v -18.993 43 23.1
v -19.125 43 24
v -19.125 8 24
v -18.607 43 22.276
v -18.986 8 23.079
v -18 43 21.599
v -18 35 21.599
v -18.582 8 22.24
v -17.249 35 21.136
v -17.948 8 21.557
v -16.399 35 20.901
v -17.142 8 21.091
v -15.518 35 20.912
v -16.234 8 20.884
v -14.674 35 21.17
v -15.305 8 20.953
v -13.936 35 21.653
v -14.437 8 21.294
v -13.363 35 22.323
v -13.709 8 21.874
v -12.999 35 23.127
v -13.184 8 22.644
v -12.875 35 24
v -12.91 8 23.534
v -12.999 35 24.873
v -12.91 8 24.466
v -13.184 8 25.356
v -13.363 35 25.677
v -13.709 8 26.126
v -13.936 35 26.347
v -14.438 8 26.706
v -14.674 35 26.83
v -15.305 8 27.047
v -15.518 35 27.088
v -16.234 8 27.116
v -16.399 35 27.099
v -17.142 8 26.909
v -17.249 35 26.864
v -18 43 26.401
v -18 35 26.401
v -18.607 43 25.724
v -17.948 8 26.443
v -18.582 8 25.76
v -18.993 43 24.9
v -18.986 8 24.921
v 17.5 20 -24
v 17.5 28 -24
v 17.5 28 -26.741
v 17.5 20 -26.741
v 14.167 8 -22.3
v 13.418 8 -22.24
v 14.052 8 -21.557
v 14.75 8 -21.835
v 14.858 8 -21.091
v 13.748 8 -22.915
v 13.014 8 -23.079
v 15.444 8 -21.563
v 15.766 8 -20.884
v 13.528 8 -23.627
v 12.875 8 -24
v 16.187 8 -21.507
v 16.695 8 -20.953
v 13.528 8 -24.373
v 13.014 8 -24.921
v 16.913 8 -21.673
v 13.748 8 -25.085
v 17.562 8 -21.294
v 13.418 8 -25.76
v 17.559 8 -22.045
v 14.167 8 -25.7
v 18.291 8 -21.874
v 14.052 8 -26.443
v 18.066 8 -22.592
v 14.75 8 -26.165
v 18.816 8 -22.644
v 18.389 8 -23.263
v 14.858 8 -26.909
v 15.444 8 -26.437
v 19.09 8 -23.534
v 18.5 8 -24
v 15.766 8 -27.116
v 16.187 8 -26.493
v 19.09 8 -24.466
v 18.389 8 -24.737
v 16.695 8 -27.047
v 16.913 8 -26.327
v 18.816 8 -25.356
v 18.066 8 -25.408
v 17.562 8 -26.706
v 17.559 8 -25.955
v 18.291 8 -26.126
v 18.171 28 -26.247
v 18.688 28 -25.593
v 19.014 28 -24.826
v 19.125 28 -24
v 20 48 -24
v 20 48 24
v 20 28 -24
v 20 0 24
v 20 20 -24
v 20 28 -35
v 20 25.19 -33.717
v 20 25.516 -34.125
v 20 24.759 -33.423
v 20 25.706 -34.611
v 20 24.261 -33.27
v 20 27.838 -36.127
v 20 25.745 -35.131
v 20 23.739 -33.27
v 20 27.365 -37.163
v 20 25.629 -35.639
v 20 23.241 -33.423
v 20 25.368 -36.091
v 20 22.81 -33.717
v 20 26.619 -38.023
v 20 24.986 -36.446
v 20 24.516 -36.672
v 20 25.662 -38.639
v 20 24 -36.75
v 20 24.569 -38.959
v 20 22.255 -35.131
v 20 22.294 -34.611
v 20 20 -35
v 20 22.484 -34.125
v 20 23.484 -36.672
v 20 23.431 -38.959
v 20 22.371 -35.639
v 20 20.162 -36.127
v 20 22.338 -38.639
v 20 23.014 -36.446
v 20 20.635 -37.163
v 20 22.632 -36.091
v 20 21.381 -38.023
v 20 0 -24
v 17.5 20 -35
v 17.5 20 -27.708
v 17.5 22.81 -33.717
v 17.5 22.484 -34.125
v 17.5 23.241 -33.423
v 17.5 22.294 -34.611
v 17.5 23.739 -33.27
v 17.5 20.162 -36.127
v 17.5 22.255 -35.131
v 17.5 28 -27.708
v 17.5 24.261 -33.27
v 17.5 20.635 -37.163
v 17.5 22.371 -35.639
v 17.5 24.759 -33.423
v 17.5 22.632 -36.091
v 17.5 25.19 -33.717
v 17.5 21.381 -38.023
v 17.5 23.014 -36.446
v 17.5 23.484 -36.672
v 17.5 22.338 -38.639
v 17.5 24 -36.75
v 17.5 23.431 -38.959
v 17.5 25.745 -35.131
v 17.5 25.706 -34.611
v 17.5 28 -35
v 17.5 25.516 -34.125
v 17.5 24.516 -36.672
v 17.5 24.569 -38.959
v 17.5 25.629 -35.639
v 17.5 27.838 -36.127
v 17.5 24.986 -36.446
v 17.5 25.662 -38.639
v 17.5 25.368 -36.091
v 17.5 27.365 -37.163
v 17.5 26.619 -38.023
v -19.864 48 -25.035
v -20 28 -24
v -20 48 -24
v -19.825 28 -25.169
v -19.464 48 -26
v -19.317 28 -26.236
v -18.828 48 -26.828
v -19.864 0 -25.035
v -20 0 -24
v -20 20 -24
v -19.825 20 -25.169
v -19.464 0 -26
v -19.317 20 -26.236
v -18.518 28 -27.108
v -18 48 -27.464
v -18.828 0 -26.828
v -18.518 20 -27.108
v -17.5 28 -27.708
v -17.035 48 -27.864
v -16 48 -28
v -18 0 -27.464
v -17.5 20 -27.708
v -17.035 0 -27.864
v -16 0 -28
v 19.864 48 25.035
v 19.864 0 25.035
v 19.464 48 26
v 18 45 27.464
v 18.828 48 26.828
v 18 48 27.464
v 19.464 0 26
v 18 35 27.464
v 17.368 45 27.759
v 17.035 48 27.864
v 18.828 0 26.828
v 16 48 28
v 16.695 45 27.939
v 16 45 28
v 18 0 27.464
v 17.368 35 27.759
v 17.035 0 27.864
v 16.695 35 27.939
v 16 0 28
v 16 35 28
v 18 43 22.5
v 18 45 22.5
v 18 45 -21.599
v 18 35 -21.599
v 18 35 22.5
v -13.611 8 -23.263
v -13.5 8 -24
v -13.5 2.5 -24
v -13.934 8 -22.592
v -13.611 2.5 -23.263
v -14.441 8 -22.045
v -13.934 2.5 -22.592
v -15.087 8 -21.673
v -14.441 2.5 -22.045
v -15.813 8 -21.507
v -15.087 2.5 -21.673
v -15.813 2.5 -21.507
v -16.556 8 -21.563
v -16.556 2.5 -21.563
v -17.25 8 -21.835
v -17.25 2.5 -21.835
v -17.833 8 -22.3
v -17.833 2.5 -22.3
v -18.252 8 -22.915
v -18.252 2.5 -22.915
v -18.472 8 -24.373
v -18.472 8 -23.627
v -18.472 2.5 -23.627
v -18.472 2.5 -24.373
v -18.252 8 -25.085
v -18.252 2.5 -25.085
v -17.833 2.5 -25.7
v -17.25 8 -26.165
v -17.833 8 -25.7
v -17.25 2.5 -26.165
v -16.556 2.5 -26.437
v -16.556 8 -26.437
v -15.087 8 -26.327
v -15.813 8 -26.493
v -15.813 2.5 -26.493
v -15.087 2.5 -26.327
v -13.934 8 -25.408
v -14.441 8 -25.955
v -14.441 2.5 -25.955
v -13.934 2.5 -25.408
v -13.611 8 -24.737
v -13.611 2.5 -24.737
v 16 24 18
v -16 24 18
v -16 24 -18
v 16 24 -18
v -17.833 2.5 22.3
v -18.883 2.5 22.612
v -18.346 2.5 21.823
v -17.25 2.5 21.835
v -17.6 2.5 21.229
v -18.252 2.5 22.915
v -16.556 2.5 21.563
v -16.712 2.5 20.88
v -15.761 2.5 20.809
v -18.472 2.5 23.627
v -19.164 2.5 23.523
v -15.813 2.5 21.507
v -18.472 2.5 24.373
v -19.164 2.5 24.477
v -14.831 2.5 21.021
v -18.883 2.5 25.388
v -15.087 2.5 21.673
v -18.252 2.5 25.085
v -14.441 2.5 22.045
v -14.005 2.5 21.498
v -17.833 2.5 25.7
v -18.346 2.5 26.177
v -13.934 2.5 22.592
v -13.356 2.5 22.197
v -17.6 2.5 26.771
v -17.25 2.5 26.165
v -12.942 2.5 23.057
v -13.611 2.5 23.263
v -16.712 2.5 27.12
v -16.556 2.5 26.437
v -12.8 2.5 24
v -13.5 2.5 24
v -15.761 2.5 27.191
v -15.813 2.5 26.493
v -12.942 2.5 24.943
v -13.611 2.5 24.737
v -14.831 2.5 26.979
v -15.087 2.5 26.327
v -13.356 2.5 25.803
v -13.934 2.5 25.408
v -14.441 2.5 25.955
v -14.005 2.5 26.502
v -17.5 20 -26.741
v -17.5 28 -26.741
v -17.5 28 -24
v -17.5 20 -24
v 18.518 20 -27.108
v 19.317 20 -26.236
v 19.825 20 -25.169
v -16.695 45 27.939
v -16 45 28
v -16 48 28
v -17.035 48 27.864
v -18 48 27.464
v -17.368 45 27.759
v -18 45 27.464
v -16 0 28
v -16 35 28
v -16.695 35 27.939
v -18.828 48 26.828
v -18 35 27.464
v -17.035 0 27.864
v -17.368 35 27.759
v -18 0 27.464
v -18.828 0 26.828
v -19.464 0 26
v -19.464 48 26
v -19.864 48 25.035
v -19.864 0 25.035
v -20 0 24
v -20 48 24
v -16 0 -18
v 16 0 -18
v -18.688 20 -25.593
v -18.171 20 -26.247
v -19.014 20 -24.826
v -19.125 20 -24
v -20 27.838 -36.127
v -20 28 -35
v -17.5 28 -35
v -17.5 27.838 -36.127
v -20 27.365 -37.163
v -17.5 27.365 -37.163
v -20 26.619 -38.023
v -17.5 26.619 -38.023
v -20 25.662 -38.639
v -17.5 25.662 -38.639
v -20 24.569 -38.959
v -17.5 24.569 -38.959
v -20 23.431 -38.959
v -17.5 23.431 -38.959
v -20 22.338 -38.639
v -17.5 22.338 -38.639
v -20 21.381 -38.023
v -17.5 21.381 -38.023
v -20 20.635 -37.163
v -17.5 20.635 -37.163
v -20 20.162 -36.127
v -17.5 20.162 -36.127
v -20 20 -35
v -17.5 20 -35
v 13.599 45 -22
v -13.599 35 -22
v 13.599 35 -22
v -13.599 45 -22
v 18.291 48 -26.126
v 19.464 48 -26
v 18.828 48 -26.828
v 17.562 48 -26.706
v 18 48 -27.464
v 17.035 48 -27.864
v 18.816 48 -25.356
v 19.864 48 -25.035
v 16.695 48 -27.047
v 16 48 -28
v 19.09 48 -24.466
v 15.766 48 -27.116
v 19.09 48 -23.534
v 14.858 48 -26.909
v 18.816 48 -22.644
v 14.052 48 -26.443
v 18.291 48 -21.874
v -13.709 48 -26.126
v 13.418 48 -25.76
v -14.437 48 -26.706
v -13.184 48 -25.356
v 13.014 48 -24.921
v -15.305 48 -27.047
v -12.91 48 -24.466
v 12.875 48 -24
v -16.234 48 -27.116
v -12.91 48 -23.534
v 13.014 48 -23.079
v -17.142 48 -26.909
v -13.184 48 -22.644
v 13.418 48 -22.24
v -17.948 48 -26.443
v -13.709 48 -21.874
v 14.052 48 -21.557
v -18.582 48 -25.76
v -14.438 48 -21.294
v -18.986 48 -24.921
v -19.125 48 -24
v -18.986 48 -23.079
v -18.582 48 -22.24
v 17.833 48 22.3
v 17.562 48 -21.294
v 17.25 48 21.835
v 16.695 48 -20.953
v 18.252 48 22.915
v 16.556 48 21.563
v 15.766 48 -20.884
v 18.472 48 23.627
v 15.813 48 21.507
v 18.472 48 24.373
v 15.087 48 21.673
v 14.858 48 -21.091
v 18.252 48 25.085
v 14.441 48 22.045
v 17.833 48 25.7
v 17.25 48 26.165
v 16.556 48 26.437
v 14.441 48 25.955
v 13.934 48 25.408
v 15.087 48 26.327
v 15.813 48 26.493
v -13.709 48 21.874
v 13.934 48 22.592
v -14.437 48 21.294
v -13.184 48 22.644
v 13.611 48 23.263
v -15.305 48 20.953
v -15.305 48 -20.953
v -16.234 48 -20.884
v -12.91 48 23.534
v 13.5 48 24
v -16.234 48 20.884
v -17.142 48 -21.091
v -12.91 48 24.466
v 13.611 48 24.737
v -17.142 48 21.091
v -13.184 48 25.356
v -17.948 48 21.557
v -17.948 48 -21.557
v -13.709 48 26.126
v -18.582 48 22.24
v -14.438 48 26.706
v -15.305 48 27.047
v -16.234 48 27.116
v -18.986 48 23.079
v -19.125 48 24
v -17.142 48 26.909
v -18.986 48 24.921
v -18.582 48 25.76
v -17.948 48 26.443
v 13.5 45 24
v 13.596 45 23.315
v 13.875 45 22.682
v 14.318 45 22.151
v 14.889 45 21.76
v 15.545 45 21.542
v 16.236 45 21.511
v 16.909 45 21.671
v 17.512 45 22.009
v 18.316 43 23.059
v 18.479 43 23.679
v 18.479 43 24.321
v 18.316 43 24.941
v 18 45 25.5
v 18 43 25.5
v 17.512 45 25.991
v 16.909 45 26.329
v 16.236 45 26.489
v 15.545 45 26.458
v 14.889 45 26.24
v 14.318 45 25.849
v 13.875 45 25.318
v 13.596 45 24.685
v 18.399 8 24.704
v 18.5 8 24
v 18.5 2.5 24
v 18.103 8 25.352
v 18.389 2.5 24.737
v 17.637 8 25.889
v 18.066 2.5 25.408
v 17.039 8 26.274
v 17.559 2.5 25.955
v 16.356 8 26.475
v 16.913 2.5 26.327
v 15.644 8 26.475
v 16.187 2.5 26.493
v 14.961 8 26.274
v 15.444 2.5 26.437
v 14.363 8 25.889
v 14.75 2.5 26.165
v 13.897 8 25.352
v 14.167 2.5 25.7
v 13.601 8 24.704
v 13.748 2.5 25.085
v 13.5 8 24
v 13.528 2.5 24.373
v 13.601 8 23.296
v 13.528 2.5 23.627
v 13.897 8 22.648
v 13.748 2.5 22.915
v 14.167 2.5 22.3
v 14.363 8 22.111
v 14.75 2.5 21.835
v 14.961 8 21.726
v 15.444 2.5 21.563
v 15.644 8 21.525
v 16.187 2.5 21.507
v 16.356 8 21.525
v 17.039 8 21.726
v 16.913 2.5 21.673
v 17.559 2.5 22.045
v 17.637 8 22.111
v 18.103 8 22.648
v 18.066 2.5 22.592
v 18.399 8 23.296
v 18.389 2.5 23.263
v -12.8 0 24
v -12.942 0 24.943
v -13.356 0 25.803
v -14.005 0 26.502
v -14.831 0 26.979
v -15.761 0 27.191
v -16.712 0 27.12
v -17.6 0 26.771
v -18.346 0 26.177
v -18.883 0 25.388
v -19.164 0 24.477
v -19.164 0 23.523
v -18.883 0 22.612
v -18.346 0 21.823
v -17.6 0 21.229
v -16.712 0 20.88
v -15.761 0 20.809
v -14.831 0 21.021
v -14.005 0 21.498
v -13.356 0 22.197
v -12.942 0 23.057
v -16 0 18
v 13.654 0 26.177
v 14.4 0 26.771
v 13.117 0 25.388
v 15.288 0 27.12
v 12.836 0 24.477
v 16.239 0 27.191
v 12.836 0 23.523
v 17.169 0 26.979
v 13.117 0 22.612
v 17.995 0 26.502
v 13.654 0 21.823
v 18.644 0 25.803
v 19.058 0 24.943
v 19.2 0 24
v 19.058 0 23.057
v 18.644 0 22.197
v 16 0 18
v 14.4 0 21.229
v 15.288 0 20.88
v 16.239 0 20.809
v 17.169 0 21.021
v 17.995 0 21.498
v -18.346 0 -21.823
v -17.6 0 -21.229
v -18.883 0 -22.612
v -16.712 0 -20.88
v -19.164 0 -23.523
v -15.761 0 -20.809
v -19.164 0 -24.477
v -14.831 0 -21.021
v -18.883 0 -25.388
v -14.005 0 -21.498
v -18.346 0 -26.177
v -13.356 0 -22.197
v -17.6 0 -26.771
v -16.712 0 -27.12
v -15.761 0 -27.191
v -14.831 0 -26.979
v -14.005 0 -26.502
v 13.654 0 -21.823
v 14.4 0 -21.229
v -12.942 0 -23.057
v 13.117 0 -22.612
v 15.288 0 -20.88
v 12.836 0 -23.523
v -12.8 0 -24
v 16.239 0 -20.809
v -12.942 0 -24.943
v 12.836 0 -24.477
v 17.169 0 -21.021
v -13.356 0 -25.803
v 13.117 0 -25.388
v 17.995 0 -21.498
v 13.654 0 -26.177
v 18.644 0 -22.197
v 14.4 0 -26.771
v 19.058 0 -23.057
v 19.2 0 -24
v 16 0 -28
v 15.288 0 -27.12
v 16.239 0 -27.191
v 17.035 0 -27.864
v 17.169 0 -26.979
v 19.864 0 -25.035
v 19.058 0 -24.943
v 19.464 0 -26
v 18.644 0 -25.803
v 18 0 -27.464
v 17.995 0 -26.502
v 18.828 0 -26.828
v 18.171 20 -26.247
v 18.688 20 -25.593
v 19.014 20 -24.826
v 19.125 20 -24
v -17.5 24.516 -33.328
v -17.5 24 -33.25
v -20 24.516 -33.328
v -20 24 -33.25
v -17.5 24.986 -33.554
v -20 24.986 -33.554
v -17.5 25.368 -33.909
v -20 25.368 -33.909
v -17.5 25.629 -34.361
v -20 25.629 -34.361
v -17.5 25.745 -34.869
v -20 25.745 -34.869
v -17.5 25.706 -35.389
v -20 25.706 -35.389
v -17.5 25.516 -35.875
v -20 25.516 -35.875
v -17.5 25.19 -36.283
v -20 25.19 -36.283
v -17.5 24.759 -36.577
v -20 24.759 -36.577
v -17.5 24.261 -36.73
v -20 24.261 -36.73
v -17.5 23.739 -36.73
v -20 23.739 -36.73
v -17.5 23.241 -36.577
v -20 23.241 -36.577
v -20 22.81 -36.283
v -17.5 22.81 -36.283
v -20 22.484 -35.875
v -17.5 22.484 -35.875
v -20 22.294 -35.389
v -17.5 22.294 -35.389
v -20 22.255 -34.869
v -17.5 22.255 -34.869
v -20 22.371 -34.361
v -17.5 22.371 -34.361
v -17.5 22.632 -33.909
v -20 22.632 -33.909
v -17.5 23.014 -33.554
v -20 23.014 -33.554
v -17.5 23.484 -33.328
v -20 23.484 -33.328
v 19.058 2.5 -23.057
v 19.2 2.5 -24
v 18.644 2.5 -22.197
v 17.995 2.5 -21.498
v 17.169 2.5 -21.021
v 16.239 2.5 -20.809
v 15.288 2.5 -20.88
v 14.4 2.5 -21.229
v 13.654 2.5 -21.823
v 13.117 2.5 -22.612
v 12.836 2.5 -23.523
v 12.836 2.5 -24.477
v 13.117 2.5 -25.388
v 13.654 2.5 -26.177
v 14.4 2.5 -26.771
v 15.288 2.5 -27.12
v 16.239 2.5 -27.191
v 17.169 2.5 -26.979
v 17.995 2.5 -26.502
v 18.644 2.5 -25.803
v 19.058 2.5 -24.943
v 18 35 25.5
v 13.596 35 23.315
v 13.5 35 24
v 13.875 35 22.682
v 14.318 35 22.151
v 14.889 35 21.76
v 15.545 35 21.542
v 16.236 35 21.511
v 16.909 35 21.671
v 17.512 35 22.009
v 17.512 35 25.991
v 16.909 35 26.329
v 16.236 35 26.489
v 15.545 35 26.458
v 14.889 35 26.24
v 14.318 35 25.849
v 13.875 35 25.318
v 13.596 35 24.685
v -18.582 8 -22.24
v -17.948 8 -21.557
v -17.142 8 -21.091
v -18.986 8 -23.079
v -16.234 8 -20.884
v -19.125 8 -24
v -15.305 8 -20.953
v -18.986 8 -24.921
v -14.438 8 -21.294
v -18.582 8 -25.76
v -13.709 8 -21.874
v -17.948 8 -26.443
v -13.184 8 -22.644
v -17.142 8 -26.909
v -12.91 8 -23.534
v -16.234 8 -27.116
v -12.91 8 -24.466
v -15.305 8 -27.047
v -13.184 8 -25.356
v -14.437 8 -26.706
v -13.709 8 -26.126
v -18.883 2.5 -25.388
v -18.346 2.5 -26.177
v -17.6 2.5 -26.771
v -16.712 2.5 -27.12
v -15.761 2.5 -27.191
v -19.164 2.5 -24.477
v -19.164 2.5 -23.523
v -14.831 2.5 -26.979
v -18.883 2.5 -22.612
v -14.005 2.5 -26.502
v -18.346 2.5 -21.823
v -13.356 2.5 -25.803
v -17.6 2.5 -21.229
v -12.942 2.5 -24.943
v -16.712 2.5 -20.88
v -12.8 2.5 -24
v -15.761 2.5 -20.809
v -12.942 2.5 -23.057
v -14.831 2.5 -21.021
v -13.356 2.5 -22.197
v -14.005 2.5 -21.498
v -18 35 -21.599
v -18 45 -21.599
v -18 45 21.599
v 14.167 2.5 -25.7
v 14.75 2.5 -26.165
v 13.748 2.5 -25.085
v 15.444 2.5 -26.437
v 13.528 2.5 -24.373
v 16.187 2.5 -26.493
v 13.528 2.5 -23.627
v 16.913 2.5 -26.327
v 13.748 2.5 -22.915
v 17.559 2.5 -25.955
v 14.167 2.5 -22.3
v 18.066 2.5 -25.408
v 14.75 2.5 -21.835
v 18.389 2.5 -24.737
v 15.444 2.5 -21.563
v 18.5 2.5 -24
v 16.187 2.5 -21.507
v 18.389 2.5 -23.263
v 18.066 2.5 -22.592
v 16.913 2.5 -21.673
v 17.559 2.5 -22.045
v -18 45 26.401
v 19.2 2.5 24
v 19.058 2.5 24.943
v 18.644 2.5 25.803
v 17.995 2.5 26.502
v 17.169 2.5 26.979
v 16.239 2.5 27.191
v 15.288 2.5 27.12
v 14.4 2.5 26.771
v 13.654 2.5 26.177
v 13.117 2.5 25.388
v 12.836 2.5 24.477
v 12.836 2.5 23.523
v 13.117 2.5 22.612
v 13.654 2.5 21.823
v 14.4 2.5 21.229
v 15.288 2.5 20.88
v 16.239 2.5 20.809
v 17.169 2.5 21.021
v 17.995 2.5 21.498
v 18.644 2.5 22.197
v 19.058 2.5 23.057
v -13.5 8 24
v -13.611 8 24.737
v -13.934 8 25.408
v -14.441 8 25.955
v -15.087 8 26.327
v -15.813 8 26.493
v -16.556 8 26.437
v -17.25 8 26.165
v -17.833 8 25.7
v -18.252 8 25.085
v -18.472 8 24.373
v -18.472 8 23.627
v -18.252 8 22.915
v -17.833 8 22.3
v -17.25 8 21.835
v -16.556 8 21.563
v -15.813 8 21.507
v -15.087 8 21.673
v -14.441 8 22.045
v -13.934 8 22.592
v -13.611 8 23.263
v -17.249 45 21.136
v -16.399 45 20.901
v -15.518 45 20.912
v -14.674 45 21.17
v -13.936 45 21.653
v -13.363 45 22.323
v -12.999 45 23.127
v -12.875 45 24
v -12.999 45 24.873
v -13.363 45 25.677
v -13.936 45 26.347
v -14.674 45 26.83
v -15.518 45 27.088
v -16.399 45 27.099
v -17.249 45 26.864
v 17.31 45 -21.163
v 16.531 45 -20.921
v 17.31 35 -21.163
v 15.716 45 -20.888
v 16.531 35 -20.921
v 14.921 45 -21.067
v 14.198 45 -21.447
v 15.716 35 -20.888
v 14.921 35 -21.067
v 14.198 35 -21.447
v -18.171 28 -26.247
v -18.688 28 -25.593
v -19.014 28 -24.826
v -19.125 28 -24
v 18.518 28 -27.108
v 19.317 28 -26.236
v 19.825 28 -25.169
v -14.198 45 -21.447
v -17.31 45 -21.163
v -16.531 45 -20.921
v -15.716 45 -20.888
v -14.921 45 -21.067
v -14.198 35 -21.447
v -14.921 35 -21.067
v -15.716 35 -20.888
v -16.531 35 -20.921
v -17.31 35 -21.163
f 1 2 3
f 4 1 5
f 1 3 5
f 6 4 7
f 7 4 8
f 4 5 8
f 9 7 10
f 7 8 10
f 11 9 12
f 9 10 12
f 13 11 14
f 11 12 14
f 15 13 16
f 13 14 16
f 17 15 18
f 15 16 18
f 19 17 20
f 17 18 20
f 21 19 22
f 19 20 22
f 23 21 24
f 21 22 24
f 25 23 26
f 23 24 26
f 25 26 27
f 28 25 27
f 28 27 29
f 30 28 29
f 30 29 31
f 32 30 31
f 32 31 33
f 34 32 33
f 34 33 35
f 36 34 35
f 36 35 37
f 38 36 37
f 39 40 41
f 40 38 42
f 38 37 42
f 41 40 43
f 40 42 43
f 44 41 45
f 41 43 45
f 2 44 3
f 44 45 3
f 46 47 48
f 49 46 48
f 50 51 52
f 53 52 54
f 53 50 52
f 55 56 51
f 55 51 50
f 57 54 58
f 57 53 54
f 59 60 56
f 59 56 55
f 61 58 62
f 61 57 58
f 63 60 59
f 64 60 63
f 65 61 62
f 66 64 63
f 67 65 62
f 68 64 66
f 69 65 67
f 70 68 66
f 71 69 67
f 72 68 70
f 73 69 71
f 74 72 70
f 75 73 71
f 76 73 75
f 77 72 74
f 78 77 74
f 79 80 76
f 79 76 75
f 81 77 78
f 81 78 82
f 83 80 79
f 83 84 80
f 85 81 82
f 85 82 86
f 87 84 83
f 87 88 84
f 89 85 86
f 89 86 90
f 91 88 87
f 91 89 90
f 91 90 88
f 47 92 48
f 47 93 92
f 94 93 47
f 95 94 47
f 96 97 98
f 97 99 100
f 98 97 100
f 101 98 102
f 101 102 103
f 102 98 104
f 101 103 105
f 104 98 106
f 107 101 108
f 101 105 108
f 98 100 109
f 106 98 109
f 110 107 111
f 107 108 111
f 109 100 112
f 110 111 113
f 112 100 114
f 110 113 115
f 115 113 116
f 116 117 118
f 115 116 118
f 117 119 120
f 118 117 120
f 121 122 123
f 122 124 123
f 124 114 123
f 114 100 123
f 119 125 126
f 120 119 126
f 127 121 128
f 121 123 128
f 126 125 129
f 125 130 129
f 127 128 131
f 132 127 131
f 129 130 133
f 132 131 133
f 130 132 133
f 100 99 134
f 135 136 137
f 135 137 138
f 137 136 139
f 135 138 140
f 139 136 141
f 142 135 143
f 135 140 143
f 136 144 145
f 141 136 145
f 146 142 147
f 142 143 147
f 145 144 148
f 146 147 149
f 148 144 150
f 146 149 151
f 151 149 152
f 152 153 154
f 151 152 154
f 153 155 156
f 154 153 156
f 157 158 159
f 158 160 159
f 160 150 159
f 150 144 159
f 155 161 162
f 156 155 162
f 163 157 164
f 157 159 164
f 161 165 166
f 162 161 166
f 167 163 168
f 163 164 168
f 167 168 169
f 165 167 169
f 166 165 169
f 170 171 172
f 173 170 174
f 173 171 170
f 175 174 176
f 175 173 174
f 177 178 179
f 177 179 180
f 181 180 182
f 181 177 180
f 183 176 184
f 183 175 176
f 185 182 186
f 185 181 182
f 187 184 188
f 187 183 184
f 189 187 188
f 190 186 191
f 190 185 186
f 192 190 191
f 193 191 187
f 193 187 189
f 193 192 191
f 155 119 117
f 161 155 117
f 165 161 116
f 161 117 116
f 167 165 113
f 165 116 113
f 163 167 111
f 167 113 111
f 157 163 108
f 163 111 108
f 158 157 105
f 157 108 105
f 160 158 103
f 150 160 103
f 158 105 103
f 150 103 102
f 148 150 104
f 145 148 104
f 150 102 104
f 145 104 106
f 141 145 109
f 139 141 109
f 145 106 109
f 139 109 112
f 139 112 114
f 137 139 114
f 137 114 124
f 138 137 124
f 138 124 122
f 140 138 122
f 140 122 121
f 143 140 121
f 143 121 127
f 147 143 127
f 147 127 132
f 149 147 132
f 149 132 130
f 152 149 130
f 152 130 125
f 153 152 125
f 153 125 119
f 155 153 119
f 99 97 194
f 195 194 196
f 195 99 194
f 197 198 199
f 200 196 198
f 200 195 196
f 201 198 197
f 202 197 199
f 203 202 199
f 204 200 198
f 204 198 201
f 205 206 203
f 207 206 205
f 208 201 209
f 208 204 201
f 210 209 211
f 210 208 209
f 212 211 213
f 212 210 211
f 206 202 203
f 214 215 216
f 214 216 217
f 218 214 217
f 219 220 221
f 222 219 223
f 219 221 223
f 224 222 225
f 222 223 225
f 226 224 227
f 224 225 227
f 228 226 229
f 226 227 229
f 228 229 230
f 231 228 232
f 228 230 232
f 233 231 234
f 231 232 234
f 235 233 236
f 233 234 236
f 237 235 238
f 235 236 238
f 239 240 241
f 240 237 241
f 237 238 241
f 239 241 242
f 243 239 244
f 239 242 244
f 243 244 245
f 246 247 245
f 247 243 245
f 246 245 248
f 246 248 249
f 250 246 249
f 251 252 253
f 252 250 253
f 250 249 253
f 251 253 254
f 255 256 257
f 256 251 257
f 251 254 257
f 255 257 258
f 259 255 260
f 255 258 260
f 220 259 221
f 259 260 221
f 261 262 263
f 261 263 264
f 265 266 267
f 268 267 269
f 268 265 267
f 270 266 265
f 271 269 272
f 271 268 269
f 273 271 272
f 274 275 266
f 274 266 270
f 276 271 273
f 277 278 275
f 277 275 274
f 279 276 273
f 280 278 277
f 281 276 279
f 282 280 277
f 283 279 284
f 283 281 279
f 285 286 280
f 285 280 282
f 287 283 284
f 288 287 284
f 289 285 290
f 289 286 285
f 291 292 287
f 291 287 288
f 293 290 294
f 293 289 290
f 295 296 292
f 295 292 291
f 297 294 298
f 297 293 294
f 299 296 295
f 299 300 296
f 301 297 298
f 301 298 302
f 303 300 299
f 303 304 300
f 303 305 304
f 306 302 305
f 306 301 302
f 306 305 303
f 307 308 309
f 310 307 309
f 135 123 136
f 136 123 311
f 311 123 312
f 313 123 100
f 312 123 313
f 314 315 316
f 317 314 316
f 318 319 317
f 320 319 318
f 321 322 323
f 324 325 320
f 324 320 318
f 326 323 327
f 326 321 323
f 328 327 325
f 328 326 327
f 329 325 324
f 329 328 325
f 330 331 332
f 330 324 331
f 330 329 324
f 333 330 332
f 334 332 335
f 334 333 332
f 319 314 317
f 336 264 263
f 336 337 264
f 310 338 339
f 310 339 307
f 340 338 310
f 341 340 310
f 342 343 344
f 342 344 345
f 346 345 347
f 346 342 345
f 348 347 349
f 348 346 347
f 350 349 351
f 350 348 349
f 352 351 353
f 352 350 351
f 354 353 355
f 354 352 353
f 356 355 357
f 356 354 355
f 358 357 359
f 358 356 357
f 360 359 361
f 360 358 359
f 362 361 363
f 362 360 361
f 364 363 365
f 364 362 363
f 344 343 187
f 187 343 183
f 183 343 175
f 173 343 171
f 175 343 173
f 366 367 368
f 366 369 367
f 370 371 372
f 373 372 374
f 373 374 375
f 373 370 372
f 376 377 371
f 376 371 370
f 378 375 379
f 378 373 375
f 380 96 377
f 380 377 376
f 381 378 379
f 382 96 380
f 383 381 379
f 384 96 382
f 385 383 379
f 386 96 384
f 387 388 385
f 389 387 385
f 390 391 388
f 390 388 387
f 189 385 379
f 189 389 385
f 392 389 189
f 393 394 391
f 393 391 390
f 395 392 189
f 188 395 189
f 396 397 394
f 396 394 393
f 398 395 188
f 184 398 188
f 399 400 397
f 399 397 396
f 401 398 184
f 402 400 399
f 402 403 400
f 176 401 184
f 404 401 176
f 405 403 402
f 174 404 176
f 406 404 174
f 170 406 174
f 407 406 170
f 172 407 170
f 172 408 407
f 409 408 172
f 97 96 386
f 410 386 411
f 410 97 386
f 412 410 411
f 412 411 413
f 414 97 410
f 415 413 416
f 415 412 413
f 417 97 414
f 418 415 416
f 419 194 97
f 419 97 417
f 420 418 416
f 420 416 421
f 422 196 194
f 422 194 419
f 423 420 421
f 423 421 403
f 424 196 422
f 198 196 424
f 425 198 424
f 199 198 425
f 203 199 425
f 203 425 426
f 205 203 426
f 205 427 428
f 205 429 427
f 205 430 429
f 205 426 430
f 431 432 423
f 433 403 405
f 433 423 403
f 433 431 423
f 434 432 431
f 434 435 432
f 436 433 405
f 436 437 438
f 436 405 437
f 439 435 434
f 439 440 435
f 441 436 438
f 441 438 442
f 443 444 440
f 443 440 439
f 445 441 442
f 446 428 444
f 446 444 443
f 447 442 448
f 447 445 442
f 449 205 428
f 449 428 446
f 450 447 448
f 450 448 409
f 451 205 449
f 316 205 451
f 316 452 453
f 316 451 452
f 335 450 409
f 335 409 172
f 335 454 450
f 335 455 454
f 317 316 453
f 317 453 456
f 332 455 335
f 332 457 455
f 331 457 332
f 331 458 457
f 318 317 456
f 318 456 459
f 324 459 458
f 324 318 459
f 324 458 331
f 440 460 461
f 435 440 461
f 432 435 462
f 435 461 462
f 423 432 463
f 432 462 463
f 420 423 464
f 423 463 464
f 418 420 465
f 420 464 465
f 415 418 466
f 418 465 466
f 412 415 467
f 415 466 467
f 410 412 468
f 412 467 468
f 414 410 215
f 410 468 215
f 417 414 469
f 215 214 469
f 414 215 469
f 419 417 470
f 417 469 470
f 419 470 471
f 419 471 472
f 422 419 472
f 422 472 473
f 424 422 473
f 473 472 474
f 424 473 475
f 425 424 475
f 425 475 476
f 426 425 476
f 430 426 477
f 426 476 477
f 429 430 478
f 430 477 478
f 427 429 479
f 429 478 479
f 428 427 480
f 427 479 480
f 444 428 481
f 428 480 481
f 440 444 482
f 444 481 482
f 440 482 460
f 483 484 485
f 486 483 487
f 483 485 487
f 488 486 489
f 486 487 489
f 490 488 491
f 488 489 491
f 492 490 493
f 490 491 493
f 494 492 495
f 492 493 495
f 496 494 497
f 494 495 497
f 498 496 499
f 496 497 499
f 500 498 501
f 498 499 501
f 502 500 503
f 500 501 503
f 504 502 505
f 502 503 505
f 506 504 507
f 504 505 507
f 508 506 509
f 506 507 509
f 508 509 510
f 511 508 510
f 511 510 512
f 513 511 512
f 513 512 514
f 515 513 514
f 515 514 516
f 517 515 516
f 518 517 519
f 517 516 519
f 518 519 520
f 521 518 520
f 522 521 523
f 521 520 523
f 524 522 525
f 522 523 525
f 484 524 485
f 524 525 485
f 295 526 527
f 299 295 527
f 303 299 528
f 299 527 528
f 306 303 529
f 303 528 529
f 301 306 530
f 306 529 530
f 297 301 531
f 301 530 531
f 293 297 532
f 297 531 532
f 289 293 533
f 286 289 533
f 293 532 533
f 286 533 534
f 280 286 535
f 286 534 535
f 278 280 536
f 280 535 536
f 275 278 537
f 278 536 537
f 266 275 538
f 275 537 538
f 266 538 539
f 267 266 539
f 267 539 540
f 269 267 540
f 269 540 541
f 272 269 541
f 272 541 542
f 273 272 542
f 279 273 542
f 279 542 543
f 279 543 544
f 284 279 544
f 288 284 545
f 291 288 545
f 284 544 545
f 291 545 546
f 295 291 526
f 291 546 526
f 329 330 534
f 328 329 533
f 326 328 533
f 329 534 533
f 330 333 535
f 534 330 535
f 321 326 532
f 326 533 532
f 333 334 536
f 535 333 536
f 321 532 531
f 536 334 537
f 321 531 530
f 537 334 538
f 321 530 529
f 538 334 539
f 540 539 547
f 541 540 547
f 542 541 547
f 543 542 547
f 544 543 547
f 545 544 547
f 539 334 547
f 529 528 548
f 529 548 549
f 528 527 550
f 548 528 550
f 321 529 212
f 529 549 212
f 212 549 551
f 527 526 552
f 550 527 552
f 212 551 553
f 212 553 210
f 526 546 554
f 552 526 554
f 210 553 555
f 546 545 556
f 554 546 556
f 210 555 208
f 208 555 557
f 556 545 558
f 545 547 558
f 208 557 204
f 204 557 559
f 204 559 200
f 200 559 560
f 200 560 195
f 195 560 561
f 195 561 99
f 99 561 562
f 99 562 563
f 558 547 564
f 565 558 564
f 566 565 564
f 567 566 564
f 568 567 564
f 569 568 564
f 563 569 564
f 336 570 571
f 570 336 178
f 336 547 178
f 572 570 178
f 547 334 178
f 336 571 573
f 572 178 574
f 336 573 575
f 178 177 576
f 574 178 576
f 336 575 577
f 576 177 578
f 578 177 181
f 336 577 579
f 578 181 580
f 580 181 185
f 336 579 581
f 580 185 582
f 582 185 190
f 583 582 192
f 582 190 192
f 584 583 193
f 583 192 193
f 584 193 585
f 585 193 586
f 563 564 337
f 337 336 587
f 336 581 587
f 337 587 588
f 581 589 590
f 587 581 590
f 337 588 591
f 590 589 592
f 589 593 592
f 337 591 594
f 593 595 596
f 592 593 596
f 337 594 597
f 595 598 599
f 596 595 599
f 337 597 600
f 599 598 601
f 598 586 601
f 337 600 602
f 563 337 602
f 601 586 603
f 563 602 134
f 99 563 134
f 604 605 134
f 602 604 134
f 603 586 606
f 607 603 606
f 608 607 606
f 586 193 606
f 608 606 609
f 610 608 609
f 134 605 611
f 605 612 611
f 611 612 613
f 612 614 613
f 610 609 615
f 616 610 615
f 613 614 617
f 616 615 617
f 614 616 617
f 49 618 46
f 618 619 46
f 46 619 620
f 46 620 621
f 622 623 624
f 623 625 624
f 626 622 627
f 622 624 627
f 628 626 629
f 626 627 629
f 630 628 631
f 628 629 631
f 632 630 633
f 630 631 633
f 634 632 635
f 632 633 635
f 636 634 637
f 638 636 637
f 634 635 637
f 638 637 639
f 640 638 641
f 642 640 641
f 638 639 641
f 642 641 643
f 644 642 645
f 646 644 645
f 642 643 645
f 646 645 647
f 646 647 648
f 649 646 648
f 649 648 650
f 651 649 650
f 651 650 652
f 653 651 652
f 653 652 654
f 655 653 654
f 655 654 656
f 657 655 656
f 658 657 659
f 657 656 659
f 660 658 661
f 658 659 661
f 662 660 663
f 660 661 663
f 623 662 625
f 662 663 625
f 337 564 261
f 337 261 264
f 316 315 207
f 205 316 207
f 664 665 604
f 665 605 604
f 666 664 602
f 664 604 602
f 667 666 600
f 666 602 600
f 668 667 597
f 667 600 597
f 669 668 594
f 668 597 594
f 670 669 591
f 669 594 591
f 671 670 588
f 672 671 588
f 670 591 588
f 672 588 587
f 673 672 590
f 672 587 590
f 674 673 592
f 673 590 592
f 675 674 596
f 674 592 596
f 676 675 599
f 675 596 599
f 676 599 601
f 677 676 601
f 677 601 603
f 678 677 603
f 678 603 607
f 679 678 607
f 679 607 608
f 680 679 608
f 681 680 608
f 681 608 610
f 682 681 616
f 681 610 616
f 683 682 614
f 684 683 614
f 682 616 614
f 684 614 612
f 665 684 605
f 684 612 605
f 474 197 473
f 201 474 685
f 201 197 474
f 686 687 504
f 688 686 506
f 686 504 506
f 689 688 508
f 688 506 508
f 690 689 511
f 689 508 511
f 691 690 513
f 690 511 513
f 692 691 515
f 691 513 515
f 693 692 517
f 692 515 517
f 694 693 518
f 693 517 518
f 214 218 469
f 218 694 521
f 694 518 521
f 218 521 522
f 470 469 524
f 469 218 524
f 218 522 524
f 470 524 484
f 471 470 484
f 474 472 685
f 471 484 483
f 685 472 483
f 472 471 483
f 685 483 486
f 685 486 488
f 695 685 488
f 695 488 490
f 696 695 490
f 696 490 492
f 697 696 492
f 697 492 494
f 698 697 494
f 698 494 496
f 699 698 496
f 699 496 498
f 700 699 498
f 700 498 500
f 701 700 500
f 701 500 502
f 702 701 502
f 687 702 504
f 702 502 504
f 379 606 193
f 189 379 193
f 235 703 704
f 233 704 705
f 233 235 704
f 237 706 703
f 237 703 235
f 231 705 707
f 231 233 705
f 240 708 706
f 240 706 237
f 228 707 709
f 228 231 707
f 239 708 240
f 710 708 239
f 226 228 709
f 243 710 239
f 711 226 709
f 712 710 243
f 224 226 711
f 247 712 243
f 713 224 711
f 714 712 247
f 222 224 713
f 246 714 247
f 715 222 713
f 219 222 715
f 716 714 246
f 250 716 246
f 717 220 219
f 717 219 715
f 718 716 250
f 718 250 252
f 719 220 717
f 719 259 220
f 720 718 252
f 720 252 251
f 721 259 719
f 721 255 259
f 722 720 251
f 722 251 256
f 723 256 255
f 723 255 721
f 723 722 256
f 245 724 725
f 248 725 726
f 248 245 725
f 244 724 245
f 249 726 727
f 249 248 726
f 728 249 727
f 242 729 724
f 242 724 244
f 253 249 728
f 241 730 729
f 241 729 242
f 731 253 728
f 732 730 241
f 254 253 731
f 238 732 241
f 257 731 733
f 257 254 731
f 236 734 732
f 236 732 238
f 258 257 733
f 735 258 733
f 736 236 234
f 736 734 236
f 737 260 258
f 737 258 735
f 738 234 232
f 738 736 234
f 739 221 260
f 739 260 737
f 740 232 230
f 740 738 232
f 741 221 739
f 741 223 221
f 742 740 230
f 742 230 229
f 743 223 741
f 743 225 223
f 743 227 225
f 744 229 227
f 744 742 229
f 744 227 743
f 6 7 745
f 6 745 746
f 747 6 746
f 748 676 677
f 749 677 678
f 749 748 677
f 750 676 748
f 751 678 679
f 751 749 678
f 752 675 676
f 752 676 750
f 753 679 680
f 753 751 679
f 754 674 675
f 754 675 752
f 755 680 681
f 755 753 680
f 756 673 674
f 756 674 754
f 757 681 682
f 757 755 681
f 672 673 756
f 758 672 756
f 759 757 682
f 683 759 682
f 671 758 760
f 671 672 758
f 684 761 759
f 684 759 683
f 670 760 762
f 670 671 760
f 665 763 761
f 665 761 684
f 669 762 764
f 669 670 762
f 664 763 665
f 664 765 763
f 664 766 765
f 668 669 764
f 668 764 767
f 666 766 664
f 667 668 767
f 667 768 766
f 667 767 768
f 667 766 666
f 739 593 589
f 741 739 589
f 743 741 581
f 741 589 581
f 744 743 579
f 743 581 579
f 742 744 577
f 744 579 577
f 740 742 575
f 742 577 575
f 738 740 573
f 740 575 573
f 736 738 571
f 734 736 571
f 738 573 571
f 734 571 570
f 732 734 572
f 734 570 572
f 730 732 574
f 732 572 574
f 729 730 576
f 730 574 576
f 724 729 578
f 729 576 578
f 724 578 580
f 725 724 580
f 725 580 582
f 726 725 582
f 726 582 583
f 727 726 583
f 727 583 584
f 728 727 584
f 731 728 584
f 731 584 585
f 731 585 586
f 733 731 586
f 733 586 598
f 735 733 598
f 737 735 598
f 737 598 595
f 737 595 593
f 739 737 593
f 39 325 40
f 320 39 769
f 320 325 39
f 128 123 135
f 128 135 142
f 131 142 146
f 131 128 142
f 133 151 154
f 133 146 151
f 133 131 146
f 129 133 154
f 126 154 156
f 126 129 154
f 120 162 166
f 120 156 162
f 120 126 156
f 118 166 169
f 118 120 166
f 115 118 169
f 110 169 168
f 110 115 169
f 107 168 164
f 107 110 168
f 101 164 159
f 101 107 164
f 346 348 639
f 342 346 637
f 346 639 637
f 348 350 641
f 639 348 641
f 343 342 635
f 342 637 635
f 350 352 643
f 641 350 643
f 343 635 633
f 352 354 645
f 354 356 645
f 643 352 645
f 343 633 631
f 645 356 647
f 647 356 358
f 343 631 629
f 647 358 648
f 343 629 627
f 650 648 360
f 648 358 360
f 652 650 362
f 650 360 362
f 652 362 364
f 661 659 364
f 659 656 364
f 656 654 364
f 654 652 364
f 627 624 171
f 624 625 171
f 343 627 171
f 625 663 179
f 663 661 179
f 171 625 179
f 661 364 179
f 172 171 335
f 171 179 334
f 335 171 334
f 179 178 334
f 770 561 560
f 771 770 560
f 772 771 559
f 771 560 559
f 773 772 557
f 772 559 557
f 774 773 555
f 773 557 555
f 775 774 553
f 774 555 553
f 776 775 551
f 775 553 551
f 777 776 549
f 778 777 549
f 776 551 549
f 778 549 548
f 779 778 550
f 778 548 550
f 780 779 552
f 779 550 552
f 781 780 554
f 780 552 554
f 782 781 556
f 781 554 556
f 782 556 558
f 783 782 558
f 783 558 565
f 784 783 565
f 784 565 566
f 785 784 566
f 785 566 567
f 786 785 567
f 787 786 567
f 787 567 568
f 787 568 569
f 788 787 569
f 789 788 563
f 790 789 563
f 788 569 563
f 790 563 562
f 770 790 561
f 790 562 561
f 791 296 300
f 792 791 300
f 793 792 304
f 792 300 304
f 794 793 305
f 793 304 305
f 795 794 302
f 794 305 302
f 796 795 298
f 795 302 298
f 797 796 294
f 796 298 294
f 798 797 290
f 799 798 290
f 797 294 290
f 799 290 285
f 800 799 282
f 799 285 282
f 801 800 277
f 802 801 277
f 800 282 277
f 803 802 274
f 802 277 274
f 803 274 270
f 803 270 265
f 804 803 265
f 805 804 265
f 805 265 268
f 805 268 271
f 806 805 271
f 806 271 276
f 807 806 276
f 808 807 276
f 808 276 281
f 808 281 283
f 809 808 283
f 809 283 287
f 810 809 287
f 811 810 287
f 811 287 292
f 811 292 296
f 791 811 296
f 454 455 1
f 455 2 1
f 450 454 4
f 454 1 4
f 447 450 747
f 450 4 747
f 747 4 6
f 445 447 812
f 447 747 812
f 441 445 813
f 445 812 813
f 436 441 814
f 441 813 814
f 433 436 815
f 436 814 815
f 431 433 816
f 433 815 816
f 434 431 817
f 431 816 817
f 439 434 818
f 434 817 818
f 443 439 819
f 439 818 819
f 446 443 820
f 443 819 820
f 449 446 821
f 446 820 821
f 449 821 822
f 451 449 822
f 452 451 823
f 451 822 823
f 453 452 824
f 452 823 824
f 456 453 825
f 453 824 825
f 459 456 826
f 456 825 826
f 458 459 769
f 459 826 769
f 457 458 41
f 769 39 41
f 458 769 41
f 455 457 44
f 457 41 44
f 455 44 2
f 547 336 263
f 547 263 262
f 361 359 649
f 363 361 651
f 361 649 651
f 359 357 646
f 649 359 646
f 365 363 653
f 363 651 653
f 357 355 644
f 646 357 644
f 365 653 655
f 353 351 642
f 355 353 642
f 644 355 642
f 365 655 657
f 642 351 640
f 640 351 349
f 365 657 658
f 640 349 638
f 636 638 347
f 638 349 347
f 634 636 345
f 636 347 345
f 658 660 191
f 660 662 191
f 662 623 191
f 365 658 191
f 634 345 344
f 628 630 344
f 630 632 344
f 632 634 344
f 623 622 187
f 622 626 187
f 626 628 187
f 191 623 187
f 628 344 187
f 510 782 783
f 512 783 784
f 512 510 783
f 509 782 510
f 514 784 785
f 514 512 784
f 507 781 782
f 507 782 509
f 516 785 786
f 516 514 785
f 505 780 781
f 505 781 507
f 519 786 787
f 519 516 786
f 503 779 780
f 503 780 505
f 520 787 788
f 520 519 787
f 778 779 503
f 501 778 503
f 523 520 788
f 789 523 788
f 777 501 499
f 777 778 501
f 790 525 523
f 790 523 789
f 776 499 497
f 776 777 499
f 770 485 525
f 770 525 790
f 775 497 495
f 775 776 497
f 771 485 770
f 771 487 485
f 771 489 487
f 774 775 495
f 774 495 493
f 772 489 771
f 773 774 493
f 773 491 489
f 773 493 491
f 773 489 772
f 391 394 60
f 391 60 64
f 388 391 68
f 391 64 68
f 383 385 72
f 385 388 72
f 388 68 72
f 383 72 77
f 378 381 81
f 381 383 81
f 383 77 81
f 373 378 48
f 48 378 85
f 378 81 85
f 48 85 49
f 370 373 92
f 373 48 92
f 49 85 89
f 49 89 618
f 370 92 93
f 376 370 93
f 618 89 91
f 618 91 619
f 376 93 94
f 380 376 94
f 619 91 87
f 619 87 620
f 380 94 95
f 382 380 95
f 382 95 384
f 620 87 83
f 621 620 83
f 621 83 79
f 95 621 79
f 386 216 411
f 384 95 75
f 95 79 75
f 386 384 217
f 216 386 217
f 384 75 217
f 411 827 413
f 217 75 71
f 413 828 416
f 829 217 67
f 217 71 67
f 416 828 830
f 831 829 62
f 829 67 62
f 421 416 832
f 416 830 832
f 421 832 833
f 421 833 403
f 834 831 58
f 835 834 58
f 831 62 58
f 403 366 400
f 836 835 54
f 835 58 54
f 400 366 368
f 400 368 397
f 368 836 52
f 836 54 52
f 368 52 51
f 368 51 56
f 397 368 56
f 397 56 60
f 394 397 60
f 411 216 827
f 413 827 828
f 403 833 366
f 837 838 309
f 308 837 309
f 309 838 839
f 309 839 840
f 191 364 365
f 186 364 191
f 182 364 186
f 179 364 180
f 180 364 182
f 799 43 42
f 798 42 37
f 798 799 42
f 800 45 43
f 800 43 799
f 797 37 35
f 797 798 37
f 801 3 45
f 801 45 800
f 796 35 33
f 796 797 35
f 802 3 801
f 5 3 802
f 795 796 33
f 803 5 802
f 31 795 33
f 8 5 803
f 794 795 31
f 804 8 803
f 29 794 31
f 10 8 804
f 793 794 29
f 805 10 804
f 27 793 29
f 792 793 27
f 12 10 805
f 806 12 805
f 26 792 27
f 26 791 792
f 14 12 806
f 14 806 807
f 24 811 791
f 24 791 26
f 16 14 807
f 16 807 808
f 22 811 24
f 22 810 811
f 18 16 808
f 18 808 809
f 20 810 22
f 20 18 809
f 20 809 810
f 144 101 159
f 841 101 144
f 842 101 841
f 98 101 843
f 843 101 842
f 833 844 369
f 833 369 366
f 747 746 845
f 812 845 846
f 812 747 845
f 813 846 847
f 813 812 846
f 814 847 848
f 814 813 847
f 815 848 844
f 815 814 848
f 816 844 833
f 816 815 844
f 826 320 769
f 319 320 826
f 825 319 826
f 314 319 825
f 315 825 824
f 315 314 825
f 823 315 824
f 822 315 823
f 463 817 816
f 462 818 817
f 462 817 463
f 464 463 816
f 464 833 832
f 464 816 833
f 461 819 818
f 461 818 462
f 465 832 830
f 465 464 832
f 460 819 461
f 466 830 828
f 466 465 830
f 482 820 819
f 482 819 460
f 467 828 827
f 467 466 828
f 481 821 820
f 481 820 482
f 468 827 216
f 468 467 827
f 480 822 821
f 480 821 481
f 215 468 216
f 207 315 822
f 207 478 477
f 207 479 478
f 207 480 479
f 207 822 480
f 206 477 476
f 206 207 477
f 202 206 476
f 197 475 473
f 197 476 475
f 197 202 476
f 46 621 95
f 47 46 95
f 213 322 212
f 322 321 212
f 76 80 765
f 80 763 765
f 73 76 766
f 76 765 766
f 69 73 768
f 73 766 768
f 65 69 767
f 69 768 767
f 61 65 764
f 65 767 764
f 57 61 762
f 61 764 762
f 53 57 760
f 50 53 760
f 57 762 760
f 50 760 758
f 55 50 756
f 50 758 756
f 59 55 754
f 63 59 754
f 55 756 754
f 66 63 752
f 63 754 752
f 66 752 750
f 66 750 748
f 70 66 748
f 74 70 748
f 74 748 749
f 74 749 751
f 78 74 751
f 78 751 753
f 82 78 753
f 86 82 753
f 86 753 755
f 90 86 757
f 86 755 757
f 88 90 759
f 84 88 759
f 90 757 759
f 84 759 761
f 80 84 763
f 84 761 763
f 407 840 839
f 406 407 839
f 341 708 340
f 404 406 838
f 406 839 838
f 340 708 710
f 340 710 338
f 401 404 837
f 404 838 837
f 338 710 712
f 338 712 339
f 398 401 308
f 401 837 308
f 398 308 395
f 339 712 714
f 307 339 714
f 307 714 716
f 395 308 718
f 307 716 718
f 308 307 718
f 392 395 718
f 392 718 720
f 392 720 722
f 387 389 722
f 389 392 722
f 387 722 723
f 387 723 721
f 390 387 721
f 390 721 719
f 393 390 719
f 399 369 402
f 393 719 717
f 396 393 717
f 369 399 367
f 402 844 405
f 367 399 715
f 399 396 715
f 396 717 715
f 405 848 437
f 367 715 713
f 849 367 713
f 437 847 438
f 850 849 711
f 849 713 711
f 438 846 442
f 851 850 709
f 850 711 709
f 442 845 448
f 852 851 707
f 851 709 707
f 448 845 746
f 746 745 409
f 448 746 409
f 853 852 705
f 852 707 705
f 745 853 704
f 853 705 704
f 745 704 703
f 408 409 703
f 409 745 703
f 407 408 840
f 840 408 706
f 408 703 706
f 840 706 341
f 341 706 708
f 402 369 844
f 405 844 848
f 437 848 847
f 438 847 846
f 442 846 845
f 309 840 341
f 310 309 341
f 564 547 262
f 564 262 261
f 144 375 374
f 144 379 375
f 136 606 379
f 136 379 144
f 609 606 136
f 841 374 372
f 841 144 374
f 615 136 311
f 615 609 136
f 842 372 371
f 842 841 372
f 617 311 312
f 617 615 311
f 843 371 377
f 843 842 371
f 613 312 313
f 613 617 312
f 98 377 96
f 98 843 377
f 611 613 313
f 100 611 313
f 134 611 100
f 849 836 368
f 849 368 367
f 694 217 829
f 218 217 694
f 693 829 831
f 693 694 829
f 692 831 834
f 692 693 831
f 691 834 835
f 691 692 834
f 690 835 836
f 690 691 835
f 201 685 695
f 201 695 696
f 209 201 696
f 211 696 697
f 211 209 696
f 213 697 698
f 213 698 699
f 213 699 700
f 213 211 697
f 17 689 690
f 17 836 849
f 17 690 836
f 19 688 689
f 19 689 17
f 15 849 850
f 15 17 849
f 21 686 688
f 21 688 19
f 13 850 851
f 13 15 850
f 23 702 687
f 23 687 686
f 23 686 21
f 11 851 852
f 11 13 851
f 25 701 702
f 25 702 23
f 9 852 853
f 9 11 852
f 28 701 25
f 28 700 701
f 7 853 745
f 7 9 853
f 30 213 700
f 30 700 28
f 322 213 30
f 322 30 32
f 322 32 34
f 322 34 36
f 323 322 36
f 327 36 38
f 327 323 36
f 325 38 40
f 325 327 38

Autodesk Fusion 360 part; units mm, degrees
sketch "Sketch1" plane through (0, 0, 0) normal (0, 1, 0) x (1, 0, 0)
  line L0 (-16, 24) -> (16, 24)
  line L1 (16, 24) -> (16, -24)
  line L2 (16, -24) -> (-16, -24)
  line L3 (-16, -24) -> (-16, 24)
  line L4 (-16, 24) -> (16, -24) construction
  line L5 (16, 24) -> (-16, -24) construction
  circle A0 centre (-16, 24) radius 2.5
  circle A1 centre (16, 24) radius 2.5
  circle A2 centre (-16, -24) radius 2.5
  circle A3 centre (16, -24) radius 2.5
  circle A4 centre (-16, -24) radius 4
  circle A5 centre (16, -24) radius 4
  circle A6 centre (16, 24) radius 4
  circle A7 centre (-16, 24) radius 4
  line L6 (-16, 24) -> (-16, 28)
  line L7 (-16, 28) -> (16, 28)
  line L8 (-16, 24) -> (-20, 24)
  line L9 (-16, -24) -> (-20, -24)
  line L10 (-20, 24) -> (-20, -24)
  line L11 (-16, -24) -> (-16, -28)
  line L12 (-16, -28) -> (16, -28)
  line L13 (16, -24) -> (20, -24)
  line L14 (20, -24) -> (20, 24)
  dimension "d1" = 32
  dimension "d2" = 48
  dimension "d3" = 5
  dimension "d4" = 5
  dimension "d5" = 5
  dimension "d6" = 5
  dimension "d7" = 8
  dimension "d8" = 8
  dimension "d9" = 8
  dimension "d10" = 8
extrude "Extrude1" add sketch "Sketch1" along normal blind 8 contours L0 A0 A7 L6 | L0 L3 A0 A7 | L3 A0 A7 L8 | A0 A7 L6 L8 | L0 A6 A7 L7 | L0 L1 L2 L3 A4 A5 A6 A7 | L3 A4 A7 L10 | L0 L1 A1 A6 | L0 L1 A1 A6 | L2 L3 A2 A4 | L3 A2 A4 L9 | A2 A4 L9 L11 | L1 A5 A6 L14 | L2 A2 A4 L11 | L2 A4 A5 L12 | L1 A3 A5 L13 | L1 L2 A3 A5 | L2 A3 A5 L13
sketch "Sketch2" plane through (0, 0, 0) normal (0, -1, 0) x (1, 0, 0)
  circle A0 centre (16, 24) radius 2.5
  circle A1 centre (-16, 24) radius 2.5
  circle A2 centre (-16, -24) radius 2.5
  circle A3 centre (16, -24) radius 2.5
  arc A4 (-20, -24) -> (-16, -28) centre (-16, -24) ccw
  line L0 (-16, -28) -> (16, -28)
  arc A5 (16, -28) -> (20, -24) centre (16, -24) ccw
  line L1 (20, -24) -> (20, 24)
  arc A6 (20, 24) -> (16, 28) centre (16, 24) ccw
  line L2 (16, 28) -> (-16, 28)
  arc A7 (-16, 28) -> (-20, 24) centre (-16, 24) ccw
  line L3 (-20, 24) -> (-20, -24)
  circle A8 centre (-16, -24) radius 3.2
  circle A9 centre (16, -24) radius 3.2
  circle A10 centre (-16, 24) radius 3.2
  circle A11 centre (16, 24) radius 3.2
  dimension "d13" = 6.4
  dimension "d14" = 6.4
  dimension "d15" = 6.4
  dimension "d16" = 6.4
extrude "Extrude2" cut sketch "Sketch2" against normal blind 2.5 contours A8 | A9 | A10 | A11
sketch "Sketch3" plane through (0, 8, 0) normal (0, 1, 0) x (-1, 0, 0)
  circle A0 centre (-16, 24) radius 2.5
  circle A1 centre (16, 24) radius 2.5
  circle A2 centre (16, -24) radius 2.5
  circle A3 centre (-16, -24) radius 2.5
  arc A4 (16, -28) -> (20, -24) centre (16, -24) ccw
  line L0 (20, -24) -> (20, 24)
  arc A5 (20, 24) -> (16, 28) centre (16, 24) ccw
  line L1 (16, 28) -> (-16, 28)
  arc A6 (-16, 28) -> (-20, 24) centre (-16, 24) ccw
  line L2 (-20, 24) -> (-20, -24)
  arc A7 (-20, -24) -> (-16, -28) centre (-16, -24) ccw
  line L3 (-16, -28) -> (16, -28)
  circle A8 centre (16, -24) radius 3.125
  circle A9 centre (-16, -24) radius 3.125
  circle A10 centre (16, 24) radius 3.125
  dimension "d19" = 6.25
  dimension "d20" = 6.25
  dimension "d21" = 6.25
extrude "Extrude3" add sketch "Sketch3" along normal blind 35 contours A4 L0 A5 L1 A6 L2 A7 L3
extrude "Extrude4" add 1 faces at (5.0453, 43, 7.366) along direction (0, 1, 0) blind 5
sketch "Sketch4" plane through (0, 0, 28) normal (0, 0, 1) x (1, 0, 0)
  line L0 (-16, 0) -> (16, 0)
  line L1 (16, 0) -> (16, 48)
  line L2 (16, 48) -> (-16, 48)
  line L3 (-16, 48) -> (-16, 0)
  line L4 (-18, 45) -> (18, 45)
  line L5 (18, 45) -> (18, 35)
  line L6 (18, 35) -> (-18, 35)
  line L7 (-18, 35) -> (-18, 45)
  line L8 (-18, 45) -> (18, 35) construction
  line L9 (18, 45) -> (-18, 35) construction
  point P0 (0, 40)
extrude "Extrude5" cut sketch "Sketch4" against normal blind 50 contours L3 L4 L6 L7 | L1 L3 L4 L6 | L1 L4 L5 L6
sketch "Sketch5" plane through (-20, 0, 0) normal (-1, 0, 0) x (0, 0, 1)
  line L0 (-24, 0) -> (24, 0)
  line L1 (24, 0) -> (24, 48)
  line L2 (24, 48) -> (-24, 48)
  line L3 (-24, 48) -> (-24, 0)
  line L4 (-24, 0) -> (-24, 24)
  line L5 (-24, 24) -> (-35, 24)
  circle A0 centre (-35, 24) radius 1.75
  circle A1 centre (-35, 24) radius 4
  line L6 (-35, 24) -> (-35, 28)
  line L7 (-35, 24) -> (-35, 20)
  line L8 (-35, 20) -> (-24, 20)
  line L9 (-35, 28) -> (-24, 28)
  dimension "d28" = 3.5
  dimension "d29" = 8
extrude "Extrude6" add sketch "Sketch5" against normal blind 2.5 contours L3 L4 L5 A1 L8 | L3 L5 A1 L9 | L5 A0 A1 L7 | A0 A1 L6 L7 | L5 A0 A1 L6
sketch "Sketch6" plane through (20, 0, 0) normal (1, 0, 0) x (0, 0, -1)
  line L0 (-24, 0) -> (24, 0)
  line L1 (24, 0) -> (24, 48)
  line L2 (24, 48) -> (-24, 48)
  line L3 (-24, 48) -> (-24, 0)
  line L4 (24, 24) -> (35, 24)
  circle A0 centre (35, 24) radius 1.75
  circle A1 centre (35, 24) radius 4
  line L5 (35, 24) -> (35, 28)
  line L6 (35, 24) -> (35, 20)
  line L7 (35, 20) -> (24, 20)
  line L8 (35, 28) -> (24, 28)
  dimension "d32" = 3.5
extrude "Extrude7" add sketch "Sketch6" against normal blind 2.5 contours L1 L4 A1 L7 | L1 L4 A1 L8 | A0 A1 L5 L6 | L4 A0 A1 L6 | L4 A0 A1 L5
sketch "Sketch7" plane through (0, 0, 0) normal (0, -1, 0) x (1, 0, 0)
  circle A0 centre (16, 24) radius 3.2
  circle A1 centre (-16, -24) radius 3.2
  circle A2 centre (-16, 24) radius 3.2
  circle A3 centre (16, -24) radius 3.2
  arc A4 (-20, -24) -> (-16, -28) centre (-16, -24) ccw
  line L0 (-16, -28) -> (16, -28)
  arc A5 (16, -28) -> (20, -24) centre (16, -24) ccw
  line L1 (20, -24) -> (20, 24)
  arc A6 (20, 24) -> (16, 28) centre (16, 24) ccw
  line L2 (16, 28) -> (-16, 28)
  arc A7 (-16, 28) -> (-20, 24) centre (-16, 24) ccw
  line L3 (-20, 24) -> (-20, -24)
  line L4 (16, -18) -> (-16, -18)
  line L5 (-16, -18) -> (-16, 18)
  line L6 (-16, 18) -> (16, 18)
  line L7 (16, 18) -> (16, -18)
  line L8 (16, -18) -> (-16, 18) construction
  line L9 (-16, -18) -> (16, 18) construction
extrude "Extrude8" cut sketch "Sketch7" against normal blind 24 contours L4 L5 L6 L7
